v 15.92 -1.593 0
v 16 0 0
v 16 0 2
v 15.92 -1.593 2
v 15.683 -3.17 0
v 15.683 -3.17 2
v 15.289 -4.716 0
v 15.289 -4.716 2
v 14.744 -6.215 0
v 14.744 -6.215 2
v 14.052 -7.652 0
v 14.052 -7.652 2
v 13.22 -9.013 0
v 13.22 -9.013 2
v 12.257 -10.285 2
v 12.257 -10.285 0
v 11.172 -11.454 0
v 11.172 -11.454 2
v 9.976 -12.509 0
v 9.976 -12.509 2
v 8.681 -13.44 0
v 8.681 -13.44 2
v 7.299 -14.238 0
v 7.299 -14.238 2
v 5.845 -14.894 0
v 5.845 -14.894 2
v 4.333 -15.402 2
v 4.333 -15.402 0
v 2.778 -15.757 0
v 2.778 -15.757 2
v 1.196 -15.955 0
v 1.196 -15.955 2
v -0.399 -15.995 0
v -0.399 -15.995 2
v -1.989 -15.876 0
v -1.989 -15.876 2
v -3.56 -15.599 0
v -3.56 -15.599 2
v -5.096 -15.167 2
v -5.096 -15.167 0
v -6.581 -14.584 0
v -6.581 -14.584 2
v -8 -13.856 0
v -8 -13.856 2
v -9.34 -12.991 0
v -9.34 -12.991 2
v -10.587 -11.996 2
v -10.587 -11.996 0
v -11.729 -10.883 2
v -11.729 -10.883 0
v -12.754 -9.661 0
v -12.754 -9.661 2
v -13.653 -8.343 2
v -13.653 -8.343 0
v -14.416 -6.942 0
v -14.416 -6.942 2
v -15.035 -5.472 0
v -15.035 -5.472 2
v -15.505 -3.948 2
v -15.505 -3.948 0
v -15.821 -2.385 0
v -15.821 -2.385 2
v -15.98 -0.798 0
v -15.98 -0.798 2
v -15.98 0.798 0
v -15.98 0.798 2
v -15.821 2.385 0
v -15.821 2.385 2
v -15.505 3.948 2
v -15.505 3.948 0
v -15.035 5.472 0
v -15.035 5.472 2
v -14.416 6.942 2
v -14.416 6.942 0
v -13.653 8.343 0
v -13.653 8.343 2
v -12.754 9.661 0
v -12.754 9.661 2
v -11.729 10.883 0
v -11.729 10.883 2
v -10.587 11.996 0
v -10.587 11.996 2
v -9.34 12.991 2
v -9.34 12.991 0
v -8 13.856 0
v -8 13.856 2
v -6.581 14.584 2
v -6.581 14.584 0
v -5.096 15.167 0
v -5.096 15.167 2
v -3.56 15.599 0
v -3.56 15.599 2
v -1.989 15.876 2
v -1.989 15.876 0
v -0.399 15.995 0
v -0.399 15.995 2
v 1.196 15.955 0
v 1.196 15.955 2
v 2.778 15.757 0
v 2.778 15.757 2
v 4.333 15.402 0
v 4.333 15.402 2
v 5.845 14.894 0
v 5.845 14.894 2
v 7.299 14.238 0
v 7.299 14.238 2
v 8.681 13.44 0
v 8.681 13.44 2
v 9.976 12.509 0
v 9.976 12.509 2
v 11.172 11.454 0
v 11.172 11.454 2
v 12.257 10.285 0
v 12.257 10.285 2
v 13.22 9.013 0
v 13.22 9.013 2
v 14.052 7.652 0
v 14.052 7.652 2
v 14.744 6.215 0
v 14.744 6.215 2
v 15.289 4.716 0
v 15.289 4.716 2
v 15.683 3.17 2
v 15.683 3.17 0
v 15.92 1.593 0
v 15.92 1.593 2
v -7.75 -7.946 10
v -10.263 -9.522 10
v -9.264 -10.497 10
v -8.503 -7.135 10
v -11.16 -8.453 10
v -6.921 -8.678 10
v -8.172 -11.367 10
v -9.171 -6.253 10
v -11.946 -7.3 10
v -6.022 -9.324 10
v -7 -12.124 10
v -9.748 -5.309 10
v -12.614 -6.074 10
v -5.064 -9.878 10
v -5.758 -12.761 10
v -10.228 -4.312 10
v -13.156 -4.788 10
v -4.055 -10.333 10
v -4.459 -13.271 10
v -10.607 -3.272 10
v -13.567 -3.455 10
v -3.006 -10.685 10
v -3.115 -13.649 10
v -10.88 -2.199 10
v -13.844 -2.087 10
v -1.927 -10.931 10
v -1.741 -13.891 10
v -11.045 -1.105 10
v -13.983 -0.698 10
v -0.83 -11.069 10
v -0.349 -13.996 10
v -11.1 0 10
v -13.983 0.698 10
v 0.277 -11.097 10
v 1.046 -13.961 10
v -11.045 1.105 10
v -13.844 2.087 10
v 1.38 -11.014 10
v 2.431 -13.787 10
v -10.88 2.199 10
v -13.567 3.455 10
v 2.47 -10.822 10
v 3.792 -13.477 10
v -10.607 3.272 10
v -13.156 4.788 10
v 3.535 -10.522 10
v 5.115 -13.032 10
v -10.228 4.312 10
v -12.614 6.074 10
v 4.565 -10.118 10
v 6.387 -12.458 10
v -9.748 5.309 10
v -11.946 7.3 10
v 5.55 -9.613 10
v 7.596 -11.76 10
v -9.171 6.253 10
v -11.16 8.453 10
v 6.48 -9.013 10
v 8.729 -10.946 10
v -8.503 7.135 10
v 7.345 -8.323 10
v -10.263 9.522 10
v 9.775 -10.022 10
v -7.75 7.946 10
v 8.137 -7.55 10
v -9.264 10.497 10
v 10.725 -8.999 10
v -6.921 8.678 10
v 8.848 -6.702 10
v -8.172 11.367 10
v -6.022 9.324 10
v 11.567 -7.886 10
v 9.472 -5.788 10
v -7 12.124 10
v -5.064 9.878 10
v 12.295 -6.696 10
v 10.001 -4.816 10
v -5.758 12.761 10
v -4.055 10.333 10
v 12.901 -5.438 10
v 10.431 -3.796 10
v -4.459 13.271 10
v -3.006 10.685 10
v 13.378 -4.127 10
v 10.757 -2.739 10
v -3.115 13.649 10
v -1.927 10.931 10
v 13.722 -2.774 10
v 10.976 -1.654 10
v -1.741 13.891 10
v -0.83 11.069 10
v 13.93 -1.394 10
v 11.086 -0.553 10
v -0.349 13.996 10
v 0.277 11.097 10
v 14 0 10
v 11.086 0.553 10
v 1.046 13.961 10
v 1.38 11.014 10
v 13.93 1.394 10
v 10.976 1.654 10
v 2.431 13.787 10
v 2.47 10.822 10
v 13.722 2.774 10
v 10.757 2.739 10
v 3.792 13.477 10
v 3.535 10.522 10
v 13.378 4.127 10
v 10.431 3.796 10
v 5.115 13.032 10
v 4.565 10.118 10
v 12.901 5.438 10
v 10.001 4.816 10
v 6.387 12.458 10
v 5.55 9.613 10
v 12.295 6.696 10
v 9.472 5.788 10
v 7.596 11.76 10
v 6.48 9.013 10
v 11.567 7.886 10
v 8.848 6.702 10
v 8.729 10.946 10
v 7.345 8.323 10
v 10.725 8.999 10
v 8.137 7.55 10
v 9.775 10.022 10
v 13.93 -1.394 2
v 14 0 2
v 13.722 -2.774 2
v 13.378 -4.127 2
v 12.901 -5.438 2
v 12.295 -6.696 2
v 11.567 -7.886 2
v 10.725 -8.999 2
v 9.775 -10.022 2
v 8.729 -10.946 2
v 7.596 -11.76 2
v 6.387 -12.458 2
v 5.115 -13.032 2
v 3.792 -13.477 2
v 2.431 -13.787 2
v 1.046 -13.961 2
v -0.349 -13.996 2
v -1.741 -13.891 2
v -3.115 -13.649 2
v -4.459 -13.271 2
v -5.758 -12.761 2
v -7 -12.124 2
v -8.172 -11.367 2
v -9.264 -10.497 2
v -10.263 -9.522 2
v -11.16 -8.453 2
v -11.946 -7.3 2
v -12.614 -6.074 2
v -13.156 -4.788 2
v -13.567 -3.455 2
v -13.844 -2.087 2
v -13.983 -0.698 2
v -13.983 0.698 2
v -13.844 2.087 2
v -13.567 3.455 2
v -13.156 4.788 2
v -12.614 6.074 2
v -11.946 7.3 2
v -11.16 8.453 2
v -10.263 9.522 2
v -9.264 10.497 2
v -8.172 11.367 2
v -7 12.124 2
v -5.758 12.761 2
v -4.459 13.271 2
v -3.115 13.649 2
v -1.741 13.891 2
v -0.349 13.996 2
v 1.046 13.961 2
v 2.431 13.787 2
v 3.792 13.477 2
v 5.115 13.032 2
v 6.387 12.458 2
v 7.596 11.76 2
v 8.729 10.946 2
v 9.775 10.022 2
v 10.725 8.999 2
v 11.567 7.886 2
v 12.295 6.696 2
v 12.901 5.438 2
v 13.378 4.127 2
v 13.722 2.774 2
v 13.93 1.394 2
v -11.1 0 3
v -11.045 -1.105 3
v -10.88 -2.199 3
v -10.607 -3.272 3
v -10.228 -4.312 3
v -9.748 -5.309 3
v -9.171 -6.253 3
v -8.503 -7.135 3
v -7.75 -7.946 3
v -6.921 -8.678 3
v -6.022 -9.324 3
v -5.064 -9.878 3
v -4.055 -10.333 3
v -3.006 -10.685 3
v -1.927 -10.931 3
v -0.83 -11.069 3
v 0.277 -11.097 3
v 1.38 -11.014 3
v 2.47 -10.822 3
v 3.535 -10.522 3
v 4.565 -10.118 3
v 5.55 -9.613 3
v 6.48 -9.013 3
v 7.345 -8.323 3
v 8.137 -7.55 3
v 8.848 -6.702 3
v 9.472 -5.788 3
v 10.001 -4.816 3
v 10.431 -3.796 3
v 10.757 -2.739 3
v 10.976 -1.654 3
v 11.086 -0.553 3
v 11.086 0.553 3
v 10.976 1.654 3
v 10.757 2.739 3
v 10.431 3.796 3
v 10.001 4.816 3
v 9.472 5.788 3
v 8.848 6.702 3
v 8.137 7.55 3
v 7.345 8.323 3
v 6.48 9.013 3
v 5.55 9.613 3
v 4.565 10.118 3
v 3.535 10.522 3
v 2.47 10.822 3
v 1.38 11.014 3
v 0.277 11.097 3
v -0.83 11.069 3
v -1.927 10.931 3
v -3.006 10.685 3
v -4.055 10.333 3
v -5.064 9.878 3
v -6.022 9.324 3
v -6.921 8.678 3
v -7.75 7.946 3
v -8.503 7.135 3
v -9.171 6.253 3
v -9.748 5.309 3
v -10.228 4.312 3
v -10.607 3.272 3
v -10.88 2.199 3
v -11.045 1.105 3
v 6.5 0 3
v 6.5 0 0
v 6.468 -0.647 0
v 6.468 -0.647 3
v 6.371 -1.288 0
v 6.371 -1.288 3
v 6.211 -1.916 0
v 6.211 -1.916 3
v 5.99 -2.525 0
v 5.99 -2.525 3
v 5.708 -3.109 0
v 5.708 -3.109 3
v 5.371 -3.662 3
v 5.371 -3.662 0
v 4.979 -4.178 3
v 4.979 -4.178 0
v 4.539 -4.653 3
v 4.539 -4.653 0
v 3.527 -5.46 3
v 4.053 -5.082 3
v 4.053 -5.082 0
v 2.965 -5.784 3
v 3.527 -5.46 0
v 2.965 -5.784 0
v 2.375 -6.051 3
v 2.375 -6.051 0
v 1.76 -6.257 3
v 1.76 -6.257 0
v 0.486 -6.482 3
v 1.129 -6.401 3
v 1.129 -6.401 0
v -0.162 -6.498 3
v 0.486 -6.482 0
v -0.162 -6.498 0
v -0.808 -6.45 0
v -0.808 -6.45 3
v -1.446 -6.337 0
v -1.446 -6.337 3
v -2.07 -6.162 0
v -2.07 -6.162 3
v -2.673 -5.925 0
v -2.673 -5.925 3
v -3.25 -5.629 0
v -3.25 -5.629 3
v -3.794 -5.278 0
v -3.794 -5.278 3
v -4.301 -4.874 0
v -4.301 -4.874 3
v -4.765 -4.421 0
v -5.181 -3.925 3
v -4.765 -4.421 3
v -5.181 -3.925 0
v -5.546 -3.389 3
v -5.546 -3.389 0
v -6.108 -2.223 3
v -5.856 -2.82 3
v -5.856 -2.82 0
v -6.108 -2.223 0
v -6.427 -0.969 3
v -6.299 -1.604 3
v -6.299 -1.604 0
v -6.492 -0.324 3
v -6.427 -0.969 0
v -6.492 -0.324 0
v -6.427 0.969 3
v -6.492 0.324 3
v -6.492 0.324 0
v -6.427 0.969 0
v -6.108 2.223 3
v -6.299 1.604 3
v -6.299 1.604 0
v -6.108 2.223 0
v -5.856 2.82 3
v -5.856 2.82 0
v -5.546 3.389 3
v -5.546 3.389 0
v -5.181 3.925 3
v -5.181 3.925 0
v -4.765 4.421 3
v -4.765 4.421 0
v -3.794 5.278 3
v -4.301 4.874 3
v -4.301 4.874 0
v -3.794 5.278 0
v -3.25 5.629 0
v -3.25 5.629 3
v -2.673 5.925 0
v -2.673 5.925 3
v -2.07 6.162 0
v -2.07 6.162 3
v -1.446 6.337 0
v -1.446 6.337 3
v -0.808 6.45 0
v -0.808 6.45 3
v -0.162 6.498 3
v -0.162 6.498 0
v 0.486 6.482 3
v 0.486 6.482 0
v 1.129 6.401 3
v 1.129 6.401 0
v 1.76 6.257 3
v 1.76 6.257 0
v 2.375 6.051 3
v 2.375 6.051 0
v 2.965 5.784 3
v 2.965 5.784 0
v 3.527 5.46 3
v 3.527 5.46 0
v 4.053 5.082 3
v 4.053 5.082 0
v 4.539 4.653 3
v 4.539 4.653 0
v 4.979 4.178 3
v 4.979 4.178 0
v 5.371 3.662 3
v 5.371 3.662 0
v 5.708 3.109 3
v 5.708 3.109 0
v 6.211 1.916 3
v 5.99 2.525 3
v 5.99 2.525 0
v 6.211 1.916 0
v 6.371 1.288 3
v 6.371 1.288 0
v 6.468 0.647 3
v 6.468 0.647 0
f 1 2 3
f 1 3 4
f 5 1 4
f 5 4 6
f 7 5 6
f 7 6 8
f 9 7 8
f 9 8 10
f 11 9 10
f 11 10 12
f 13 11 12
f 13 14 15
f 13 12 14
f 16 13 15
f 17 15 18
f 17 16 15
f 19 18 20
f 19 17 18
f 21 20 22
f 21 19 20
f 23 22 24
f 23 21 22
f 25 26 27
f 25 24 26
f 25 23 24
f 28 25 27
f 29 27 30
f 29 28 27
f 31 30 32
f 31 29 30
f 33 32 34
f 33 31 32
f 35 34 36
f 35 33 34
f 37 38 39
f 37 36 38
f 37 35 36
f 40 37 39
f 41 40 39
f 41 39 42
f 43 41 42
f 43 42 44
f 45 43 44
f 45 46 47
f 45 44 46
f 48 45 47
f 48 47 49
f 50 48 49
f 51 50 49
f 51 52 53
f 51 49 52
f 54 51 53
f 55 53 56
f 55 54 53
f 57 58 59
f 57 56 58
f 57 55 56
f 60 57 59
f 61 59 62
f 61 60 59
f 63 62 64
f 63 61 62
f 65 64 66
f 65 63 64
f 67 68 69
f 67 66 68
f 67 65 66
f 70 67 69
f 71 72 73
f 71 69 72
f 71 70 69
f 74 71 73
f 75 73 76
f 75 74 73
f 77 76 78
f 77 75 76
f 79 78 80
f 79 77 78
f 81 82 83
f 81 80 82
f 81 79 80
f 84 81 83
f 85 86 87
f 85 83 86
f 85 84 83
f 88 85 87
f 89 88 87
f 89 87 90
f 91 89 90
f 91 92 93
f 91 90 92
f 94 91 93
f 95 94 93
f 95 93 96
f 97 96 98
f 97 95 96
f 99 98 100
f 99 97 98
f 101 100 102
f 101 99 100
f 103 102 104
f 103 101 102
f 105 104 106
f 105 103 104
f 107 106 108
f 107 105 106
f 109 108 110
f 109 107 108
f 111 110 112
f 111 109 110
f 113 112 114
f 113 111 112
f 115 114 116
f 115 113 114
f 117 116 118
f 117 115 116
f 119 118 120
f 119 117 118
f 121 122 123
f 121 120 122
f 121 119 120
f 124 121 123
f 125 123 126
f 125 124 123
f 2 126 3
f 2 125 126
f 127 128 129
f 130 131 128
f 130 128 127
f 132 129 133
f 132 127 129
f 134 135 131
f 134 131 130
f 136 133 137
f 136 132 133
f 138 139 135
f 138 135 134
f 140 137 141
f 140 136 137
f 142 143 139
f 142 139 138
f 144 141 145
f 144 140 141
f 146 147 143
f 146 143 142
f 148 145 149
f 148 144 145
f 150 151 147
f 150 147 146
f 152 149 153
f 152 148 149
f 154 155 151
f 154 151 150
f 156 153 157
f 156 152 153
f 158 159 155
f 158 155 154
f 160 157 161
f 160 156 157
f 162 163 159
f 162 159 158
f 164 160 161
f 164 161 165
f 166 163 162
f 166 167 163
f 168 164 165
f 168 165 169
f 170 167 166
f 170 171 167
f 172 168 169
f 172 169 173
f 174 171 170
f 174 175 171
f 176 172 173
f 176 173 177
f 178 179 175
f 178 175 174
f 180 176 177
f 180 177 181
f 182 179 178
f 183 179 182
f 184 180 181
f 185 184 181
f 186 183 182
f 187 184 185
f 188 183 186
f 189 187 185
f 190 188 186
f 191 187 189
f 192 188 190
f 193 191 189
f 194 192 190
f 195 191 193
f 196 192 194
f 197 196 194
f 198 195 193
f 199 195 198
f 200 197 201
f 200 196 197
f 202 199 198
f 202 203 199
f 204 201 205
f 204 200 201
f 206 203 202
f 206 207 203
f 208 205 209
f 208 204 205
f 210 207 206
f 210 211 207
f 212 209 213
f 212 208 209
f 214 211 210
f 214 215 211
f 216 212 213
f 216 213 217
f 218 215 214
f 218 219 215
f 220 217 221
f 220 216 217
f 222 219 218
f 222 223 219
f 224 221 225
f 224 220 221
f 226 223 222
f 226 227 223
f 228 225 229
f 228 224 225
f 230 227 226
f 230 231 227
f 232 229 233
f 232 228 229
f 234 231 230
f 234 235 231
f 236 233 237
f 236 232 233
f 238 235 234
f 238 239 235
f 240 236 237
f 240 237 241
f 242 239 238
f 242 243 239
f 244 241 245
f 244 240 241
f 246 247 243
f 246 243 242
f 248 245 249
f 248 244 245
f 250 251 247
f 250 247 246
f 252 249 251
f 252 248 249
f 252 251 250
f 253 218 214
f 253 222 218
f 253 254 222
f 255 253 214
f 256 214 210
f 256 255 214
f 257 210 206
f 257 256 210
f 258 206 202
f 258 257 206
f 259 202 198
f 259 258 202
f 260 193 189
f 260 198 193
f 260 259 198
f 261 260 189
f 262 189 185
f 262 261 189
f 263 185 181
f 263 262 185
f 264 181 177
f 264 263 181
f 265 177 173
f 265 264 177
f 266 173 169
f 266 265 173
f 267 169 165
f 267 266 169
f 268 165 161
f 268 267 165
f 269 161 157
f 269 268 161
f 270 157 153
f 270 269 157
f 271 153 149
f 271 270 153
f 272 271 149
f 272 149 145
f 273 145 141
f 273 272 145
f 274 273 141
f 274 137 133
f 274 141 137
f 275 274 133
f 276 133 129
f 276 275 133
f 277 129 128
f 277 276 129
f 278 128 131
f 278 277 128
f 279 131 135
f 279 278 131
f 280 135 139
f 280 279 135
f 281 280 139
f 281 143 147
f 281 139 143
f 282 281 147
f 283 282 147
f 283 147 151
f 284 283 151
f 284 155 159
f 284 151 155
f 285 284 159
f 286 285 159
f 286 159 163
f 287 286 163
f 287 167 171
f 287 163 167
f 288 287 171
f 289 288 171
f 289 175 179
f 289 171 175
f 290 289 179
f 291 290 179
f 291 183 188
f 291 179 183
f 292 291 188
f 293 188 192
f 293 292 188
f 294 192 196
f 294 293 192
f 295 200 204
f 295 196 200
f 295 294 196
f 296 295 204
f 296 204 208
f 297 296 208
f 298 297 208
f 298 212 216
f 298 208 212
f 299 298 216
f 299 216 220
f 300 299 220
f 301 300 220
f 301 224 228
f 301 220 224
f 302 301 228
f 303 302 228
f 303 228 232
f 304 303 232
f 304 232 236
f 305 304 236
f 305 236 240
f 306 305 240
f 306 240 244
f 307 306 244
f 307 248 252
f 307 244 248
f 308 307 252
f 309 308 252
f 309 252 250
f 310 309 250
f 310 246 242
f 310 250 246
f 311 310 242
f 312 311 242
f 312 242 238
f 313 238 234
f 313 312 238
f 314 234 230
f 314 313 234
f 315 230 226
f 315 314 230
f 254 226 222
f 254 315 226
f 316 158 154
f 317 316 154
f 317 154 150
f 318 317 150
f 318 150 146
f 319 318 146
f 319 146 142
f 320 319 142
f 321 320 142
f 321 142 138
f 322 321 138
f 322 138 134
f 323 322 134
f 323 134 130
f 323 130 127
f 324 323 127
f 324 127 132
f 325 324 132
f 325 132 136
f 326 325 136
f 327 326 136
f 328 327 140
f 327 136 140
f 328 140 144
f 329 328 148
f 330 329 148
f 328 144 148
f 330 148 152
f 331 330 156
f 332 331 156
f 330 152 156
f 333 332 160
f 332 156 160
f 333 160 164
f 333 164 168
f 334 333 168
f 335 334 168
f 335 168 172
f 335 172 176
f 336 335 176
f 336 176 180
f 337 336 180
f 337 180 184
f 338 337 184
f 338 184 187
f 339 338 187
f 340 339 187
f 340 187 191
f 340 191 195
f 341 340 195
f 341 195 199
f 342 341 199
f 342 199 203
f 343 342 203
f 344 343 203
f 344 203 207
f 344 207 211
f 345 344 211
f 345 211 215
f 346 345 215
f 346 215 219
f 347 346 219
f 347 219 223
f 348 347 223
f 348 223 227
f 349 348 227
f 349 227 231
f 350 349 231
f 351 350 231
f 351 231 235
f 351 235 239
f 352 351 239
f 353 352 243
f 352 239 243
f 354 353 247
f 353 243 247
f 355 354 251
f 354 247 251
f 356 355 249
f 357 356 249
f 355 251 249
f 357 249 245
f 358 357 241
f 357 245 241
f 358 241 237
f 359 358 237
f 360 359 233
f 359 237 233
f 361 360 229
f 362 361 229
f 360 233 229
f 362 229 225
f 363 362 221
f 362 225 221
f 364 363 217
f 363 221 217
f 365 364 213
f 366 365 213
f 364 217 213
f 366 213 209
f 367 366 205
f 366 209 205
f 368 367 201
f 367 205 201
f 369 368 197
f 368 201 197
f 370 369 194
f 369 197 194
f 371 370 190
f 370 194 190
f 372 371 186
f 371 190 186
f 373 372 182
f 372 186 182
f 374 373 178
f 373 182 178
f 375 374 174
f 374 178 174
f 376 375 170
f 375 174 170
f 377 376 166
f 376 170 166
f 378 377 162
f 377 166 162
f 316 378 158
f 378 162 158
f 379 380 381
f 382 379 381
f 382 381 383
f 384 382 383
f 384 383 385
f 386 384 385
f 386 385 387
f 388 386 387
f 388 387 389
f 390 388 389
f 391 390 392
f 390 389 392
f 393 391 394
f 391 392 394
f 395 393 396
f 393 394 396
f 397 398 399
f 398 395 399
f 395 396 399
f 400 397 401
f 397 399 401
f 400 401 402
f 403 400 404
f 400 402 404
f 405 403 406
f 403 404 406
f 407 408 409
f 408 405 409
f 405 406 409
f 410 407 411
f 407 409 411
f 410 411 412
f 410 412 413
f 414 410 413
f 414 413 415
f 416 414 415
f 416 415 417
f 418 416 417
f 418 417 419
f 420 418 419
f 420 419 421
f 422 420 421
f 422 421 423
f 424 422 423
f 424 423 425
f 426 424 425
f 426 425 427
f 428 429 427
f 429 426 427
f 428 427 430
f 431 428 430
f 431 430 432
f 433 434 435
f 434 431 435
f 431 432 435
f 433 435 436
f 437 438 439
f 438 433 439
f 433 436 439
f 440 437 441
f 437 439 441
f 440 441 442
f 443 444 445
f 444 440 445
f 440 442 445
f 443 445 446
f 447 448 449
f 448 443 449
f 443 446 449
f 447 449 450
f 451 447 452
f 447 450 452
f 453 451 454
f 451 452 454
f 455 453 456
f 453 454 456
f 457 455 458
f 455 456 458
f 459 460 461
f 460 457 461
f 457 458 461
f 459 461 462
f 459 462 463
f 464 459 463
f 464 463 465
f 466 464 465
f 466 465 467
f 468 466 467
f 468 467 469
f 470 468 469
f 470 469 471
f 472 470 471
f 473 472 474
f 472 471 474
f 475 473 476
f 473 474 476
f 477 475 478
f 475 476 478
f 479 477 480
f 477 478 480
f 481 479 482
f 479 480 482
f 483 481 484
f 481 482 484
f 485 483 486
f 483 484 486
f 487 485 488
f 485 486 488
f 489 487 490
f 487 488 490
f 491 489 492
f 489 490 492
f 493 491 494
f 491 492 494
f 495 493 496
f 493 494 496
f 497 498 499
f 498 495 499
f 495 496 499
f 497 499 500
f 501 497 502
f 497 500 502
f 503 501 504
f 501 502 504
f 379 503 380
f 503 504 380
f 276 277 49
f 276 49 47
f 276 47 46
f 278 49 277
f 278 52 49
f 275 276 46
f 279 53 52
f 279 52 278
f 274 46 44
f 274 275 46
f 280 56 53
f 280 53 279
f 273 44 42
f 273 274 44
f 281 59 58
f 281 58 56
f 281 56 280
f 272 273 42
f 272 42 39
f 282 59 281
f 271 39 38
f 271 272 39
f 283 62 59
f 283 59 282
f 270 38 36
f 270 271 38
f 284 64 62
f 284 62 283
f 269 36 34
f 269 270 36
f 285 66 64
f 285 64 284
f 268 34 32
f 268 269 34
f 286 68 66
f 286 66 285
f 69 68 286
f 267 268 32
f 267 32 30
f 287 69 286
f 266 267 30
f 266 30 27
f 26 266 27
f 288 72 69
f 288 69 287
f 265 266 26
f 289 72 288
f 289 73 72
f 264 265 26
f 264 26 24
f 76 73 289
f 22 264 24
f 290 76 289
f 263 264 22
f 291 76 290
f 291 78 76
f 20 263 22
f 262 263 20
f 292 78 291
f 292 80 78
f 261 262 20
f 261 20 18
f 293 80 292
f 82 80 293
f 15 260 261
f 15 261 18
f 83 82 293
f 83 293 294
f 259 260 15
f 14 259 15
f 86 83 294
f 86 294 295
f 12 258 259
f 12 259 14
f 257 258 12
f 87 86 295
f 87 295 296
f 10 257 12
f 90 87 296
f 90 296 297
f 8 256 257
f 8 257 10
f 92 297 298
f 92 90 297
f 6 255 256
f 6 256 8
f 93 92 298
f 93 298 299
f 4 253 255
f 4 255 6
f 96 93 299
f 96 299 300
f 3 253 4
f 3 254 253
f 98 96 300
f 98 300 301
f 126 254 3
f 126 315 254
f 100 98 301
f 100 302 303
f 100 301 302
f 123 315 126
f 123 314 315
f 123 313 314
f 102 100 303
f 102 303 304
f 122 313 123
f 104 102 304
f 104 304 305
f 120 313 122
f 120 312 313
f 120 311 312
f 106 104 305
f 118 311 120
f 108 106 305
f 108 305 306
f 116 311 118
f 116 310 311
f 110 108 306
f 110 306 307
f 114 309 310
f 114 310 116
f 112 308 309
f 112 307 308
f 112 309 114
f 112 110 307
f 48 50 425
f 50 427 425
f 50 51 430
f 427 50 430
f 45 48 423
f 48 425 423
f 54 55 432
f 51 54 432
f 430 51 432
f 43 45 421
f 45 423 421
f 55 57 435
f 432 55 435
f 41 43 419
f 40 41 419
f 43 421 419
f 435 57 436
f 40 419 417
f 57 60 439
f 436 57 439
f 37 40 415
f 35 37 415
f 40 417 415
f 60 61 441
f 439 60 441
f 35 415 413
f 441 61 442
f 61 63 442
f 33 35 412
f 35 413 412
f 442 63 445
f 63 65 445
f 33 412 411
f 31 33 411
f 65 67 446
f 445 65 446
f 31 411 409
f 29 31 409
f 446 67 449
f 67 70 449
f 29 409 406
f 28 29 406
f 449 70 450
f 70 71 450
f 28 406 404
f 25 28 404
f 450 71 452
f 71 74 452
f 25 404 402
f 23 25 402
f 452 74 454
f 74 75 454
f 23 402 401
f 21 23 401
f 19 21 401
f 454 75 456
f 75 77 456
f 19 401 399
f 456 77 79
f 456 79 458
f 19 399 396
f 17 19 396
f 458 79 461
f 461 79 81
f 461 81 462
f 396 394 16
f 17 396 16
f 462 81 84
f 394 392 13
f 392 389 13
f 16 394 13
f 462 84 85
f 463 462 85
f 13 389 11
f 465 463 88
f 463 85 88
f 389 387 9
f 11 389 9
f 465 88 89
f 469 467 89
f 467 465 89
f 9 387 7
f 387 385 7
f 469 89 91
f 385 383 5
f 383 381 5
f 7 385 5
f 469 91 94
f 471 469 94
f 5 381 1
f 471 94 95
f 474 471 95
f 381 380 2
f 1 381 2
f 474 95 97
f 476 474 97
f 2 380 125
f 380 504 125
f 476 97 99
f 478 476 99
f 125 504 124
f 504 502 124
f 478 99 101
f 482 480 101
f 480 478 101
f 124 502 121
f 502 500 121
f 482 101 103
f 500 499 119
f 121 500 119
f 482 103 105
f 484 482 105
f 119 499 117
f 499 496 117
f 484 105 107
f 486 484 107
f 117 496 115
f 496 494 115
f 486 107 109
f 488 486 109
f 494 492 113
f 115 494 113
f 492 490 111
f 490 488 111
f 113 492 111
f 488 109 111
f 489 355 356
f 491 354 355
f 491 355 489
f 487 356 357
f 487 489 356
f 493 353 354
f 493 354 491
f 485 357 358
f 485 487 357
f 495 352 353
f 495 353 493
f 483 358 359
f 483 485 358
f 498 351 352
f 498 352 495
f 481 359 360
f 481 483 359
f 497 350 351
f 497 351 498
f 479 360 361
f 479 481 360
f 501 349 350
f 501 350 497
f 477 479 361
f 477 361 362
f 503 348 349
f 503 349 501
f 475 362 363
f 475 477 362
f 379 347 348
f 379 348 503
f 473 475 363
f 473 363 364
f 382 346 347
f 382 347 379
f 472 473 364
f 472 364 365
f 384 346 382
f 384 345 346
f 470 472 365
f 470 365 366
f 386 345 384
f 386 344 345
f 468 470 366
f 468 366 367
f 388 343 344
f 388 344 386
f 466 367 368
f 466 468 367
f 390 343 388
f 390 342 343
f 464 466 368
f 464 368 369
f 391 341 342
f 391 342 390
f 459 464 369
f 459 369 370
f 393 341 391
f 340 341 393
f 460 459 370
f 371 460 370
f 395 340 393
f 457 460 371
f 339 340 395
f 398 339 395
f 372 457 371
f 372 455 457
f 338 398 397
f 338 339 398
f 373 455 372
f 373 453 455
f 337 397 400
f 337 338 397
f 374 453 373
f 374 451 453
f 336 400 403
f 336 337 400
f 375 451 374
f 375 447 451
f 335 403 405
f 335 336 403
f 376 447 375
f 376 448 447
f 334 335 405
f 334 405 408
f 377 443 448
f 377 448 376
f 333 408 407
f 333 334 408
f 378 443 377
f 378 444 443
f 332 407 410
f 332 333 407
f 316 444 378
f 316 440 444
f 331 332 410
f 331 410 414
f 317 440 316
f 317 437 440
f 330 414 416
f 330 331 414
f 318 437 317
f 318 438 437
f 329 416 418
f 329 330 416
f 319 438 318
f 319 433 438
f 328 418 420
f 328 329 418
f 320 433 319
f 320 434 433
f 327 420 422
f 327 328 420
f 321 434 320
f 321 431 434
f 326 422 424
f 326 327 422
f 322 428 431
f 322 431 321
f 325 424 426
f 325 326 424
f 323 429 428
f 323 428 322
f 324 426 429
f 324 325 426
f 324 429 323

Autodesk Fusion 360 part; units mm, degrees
sketch "Sketch1" plane through (0, 0, 0) normal (0, 0, 1) x (1, 0, 0)
  circle A0 centre (0, 0) radius 14
  circle A1 centre (0, 0) radius 16
  circle A2 centre (0, 0) radius 6.5
  dimension "d1" = 28
  dimension "d2" = 2
  dimension "d10" = 13
extrude "Extrude4" add sketch "Sketch1" along normal blind 10 contours A0
sketch "Sketch2" plane through (0, 0, 10) normal (0, 0, 1) x (-1, 0, 0)
  circle A0 centre (0, 0) radius 14
  circle A1 centre (0, 0) radius 11.1
  circle A2 centre (0, 0) radius 6.5
  circle A3 centre (0, 0) radius 6.5
  circle A4 centre (0, 0) radius 14
  circle A5 centre (0, 0) radius 6.5
  circle A6 centre (0, 0) radius 14
  dimension "d7" = 22.2
extrude "Extrude5" cut sketch "Sketch2" against normal blind 7 contours A1
extrude "Extrude6" add sketch "Sketch1" along normal blind 2 contours A1
